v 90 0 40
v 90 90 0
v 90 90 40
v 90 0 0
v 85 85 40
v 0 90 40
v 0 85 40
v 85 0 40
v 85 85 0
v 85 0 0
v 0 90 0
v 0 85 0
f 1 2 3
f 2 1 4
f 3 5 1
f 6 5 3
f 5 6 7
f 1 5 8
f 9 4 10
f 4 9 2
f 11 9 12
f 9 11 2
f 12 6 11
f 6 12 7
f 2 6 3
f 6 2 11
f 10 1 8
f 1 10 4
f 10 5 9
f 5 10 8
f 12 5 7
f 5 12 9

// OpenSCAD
// DIY Magnetic Stirrer Housing
// Based on an 80mm PC case fan
// Print orientation: Upside down (Top plate on bed, walls rising up)

// --- Dimensions ---
// Outer dimensions
W_OUT = 90;
H_OUT = 90;
// Thicknesses
T_TOP = 2;
T_WALL = 2.5;
// Height of walls (total height from bed to open top)
H_WALL = 40;
// Hole pattern for M4 screws
PATTERN_SIZE = 71.5;
D_HOLE = 4.5;
// Cable notch
NOTCH_W = 12;
NOTCH_H = 8; // Depth from open edge (z = 40 - 8 = 32)

// --- Configuration ---
$fn = 128; // High resolution for smooth curves and precise holes

// --- Helper: Create the solid box with holes ---
// We build the main block first, then subtract holes and notches.

// 1. Main Block
// Outer dimensions minus wall thickness on the sides where walls exist.
// Since it's an open box, the "inner" void is defined by the wall thickness.
// The block represents the material of the top plate and the walls.
// X range: -W_OUT/2 to +W_OUT/2
// Y range: -H_OUT/2 to +H_OUT/2
// Z range: 0 to H_WALL

// Calculate inner void dimensions for the main block subtraction logic
// Actually, it's easier to build the solid walls directly or subtract from a large block.
// Let's build the solid "L" shaped profile extruded, then subtract holes.

// Profile for extrusion (X, Y, Z)
// We want a solid block of size W_OUT x H_OUT x H_WALL, but with the top open?
// No, the prompt says: "four walls... rise from it to z = 40, where the box is open".
// This implies the top plate is solid, and the walls go up. The top is open.
// So the volume is: Top Plate (90x90x2) + 4 Walls (90x2.5x38) roughly.
// Let's construct the solid volume by unioning the top plate and the walls, 
// or simpler: Create a bounding box (90x90x40) and subtract the internal void.

// Internal void dimensions:
// The walls are 2.5mm thick.
// Void X = 90 - 2.5 - 2.5 = 85
// Void Y = 90 - 2.5 - 2.5 = 85
// Void Z = 0 to 40 (since top is open)

// However, we need to be careful with the "open top". 
// If we subtract a box from 0 to 40, we get the walls.
// But we also need the top plate.
// Let's define the solid as:
// A block 90x90x40 MINUS a box 85x85x40 (the empty space inside).
// This creates the 4 walls and the top plate correctly.

// 2. Screw Holes
// 4 holes on a 71.5mm square pattern centered on the plate.
// Center of pattern is (0,0).
// Hole centers: +/- 35.75 mm.
// Z position: Through the top plate (z=0 to z=2).
// To cut through, we extend slightly past z=2.

// 3. Cable Notch
// In one wall. Let's pick the front wall (facing +Y or -Y? Usually front is +Y or -Y).
// Let's assume the wall facing +Y is the one with the notch, centered along that wall.
// Wall location: Y = -H_OUT/2 + T_WALL/2 = -45 + 1.25 = -43.75 (approx).
// Notch width: 12mm.
// Notch depth: 8mm from the open edge (z=40). So from z=32 to z=40.
// X position: Centered on the wall (X=0).

// --- Construction ---

// Define the main housing body
difference() {
    // Start with the full bounding box
    cube([W_OUT, H_OUT, H_WALL], center = false);
    
    // Subtract the internal void
    // The void is the empty space inside the walls.
    // Width = 90 - 2*2.5 = 85
    // Height = 90 - 2*2.5 = 85
    // Depth = 40 (from z=0 to z=40)
    translate([0, 0, 0]) 
        cube([W_OUT - 2*T_WALL, H_OUT - 2*T_WALL, H_WALL], center = false);
    
    // --- Screw Holes ---
    // Pattern size 71.5, centered.
    // Offsets: +/- 71.5/2 = +/- 35.75
    for (i = [-1, 1]) {
        for (j = [-1, 1]) {
            translate([
                i * (PATTERN_SIZE / 2),
                j * (PATTERN_SIZE / 2),
                0
            ]) 
                cylinder(
                    h = T_TOP + 0.1, // Extend slightly past top plate
                    d = D_HOLE,
                    center = false
                );
        }
    }
    
    // --- Cable Notch ---
    // Located in the wall at Y = -H_OUT/2 + T_WALL/2
    // Centered in X.
    // Depth from top (z=40) is NOTCH_H.
    
    // Calculate wall Y position
    y_wall = -H_OUT/2 + T_WALL/2;
    
    // Notch geometry:
    // X: -NOTCH_W/2 to +NOTCH_W/2
    // Y: y_wall - NOTCH_W/2 to y_wall + NOTCH_W/2 (Wait, notch is IN the wall, so it cuts INTO the wall volume)
    // The wall exists from Y = y_wall - T_WALL/2 to y_wall + T_WALL/2?
    // No, the wall is the strip at Y = y_wall with thickness T_WALL.
    // So the wall occupies Y from (y_wall - T_WALL/2) to (y_wall + T_WALL/2).
    // The notch cuts through this strip.
    // So the notch Y range is: y_wall - NOTCH_W/2 to y_wall + NOTCH_W/2.
    // Z range: 40 - NOTCH_H to 40.
    
    translate([0, y_wall - NOTCH_W/2, 40 - NOTCH_H])
        cube([NOTCH_W, T_WALL, NOTCH_H], center = false);
}
